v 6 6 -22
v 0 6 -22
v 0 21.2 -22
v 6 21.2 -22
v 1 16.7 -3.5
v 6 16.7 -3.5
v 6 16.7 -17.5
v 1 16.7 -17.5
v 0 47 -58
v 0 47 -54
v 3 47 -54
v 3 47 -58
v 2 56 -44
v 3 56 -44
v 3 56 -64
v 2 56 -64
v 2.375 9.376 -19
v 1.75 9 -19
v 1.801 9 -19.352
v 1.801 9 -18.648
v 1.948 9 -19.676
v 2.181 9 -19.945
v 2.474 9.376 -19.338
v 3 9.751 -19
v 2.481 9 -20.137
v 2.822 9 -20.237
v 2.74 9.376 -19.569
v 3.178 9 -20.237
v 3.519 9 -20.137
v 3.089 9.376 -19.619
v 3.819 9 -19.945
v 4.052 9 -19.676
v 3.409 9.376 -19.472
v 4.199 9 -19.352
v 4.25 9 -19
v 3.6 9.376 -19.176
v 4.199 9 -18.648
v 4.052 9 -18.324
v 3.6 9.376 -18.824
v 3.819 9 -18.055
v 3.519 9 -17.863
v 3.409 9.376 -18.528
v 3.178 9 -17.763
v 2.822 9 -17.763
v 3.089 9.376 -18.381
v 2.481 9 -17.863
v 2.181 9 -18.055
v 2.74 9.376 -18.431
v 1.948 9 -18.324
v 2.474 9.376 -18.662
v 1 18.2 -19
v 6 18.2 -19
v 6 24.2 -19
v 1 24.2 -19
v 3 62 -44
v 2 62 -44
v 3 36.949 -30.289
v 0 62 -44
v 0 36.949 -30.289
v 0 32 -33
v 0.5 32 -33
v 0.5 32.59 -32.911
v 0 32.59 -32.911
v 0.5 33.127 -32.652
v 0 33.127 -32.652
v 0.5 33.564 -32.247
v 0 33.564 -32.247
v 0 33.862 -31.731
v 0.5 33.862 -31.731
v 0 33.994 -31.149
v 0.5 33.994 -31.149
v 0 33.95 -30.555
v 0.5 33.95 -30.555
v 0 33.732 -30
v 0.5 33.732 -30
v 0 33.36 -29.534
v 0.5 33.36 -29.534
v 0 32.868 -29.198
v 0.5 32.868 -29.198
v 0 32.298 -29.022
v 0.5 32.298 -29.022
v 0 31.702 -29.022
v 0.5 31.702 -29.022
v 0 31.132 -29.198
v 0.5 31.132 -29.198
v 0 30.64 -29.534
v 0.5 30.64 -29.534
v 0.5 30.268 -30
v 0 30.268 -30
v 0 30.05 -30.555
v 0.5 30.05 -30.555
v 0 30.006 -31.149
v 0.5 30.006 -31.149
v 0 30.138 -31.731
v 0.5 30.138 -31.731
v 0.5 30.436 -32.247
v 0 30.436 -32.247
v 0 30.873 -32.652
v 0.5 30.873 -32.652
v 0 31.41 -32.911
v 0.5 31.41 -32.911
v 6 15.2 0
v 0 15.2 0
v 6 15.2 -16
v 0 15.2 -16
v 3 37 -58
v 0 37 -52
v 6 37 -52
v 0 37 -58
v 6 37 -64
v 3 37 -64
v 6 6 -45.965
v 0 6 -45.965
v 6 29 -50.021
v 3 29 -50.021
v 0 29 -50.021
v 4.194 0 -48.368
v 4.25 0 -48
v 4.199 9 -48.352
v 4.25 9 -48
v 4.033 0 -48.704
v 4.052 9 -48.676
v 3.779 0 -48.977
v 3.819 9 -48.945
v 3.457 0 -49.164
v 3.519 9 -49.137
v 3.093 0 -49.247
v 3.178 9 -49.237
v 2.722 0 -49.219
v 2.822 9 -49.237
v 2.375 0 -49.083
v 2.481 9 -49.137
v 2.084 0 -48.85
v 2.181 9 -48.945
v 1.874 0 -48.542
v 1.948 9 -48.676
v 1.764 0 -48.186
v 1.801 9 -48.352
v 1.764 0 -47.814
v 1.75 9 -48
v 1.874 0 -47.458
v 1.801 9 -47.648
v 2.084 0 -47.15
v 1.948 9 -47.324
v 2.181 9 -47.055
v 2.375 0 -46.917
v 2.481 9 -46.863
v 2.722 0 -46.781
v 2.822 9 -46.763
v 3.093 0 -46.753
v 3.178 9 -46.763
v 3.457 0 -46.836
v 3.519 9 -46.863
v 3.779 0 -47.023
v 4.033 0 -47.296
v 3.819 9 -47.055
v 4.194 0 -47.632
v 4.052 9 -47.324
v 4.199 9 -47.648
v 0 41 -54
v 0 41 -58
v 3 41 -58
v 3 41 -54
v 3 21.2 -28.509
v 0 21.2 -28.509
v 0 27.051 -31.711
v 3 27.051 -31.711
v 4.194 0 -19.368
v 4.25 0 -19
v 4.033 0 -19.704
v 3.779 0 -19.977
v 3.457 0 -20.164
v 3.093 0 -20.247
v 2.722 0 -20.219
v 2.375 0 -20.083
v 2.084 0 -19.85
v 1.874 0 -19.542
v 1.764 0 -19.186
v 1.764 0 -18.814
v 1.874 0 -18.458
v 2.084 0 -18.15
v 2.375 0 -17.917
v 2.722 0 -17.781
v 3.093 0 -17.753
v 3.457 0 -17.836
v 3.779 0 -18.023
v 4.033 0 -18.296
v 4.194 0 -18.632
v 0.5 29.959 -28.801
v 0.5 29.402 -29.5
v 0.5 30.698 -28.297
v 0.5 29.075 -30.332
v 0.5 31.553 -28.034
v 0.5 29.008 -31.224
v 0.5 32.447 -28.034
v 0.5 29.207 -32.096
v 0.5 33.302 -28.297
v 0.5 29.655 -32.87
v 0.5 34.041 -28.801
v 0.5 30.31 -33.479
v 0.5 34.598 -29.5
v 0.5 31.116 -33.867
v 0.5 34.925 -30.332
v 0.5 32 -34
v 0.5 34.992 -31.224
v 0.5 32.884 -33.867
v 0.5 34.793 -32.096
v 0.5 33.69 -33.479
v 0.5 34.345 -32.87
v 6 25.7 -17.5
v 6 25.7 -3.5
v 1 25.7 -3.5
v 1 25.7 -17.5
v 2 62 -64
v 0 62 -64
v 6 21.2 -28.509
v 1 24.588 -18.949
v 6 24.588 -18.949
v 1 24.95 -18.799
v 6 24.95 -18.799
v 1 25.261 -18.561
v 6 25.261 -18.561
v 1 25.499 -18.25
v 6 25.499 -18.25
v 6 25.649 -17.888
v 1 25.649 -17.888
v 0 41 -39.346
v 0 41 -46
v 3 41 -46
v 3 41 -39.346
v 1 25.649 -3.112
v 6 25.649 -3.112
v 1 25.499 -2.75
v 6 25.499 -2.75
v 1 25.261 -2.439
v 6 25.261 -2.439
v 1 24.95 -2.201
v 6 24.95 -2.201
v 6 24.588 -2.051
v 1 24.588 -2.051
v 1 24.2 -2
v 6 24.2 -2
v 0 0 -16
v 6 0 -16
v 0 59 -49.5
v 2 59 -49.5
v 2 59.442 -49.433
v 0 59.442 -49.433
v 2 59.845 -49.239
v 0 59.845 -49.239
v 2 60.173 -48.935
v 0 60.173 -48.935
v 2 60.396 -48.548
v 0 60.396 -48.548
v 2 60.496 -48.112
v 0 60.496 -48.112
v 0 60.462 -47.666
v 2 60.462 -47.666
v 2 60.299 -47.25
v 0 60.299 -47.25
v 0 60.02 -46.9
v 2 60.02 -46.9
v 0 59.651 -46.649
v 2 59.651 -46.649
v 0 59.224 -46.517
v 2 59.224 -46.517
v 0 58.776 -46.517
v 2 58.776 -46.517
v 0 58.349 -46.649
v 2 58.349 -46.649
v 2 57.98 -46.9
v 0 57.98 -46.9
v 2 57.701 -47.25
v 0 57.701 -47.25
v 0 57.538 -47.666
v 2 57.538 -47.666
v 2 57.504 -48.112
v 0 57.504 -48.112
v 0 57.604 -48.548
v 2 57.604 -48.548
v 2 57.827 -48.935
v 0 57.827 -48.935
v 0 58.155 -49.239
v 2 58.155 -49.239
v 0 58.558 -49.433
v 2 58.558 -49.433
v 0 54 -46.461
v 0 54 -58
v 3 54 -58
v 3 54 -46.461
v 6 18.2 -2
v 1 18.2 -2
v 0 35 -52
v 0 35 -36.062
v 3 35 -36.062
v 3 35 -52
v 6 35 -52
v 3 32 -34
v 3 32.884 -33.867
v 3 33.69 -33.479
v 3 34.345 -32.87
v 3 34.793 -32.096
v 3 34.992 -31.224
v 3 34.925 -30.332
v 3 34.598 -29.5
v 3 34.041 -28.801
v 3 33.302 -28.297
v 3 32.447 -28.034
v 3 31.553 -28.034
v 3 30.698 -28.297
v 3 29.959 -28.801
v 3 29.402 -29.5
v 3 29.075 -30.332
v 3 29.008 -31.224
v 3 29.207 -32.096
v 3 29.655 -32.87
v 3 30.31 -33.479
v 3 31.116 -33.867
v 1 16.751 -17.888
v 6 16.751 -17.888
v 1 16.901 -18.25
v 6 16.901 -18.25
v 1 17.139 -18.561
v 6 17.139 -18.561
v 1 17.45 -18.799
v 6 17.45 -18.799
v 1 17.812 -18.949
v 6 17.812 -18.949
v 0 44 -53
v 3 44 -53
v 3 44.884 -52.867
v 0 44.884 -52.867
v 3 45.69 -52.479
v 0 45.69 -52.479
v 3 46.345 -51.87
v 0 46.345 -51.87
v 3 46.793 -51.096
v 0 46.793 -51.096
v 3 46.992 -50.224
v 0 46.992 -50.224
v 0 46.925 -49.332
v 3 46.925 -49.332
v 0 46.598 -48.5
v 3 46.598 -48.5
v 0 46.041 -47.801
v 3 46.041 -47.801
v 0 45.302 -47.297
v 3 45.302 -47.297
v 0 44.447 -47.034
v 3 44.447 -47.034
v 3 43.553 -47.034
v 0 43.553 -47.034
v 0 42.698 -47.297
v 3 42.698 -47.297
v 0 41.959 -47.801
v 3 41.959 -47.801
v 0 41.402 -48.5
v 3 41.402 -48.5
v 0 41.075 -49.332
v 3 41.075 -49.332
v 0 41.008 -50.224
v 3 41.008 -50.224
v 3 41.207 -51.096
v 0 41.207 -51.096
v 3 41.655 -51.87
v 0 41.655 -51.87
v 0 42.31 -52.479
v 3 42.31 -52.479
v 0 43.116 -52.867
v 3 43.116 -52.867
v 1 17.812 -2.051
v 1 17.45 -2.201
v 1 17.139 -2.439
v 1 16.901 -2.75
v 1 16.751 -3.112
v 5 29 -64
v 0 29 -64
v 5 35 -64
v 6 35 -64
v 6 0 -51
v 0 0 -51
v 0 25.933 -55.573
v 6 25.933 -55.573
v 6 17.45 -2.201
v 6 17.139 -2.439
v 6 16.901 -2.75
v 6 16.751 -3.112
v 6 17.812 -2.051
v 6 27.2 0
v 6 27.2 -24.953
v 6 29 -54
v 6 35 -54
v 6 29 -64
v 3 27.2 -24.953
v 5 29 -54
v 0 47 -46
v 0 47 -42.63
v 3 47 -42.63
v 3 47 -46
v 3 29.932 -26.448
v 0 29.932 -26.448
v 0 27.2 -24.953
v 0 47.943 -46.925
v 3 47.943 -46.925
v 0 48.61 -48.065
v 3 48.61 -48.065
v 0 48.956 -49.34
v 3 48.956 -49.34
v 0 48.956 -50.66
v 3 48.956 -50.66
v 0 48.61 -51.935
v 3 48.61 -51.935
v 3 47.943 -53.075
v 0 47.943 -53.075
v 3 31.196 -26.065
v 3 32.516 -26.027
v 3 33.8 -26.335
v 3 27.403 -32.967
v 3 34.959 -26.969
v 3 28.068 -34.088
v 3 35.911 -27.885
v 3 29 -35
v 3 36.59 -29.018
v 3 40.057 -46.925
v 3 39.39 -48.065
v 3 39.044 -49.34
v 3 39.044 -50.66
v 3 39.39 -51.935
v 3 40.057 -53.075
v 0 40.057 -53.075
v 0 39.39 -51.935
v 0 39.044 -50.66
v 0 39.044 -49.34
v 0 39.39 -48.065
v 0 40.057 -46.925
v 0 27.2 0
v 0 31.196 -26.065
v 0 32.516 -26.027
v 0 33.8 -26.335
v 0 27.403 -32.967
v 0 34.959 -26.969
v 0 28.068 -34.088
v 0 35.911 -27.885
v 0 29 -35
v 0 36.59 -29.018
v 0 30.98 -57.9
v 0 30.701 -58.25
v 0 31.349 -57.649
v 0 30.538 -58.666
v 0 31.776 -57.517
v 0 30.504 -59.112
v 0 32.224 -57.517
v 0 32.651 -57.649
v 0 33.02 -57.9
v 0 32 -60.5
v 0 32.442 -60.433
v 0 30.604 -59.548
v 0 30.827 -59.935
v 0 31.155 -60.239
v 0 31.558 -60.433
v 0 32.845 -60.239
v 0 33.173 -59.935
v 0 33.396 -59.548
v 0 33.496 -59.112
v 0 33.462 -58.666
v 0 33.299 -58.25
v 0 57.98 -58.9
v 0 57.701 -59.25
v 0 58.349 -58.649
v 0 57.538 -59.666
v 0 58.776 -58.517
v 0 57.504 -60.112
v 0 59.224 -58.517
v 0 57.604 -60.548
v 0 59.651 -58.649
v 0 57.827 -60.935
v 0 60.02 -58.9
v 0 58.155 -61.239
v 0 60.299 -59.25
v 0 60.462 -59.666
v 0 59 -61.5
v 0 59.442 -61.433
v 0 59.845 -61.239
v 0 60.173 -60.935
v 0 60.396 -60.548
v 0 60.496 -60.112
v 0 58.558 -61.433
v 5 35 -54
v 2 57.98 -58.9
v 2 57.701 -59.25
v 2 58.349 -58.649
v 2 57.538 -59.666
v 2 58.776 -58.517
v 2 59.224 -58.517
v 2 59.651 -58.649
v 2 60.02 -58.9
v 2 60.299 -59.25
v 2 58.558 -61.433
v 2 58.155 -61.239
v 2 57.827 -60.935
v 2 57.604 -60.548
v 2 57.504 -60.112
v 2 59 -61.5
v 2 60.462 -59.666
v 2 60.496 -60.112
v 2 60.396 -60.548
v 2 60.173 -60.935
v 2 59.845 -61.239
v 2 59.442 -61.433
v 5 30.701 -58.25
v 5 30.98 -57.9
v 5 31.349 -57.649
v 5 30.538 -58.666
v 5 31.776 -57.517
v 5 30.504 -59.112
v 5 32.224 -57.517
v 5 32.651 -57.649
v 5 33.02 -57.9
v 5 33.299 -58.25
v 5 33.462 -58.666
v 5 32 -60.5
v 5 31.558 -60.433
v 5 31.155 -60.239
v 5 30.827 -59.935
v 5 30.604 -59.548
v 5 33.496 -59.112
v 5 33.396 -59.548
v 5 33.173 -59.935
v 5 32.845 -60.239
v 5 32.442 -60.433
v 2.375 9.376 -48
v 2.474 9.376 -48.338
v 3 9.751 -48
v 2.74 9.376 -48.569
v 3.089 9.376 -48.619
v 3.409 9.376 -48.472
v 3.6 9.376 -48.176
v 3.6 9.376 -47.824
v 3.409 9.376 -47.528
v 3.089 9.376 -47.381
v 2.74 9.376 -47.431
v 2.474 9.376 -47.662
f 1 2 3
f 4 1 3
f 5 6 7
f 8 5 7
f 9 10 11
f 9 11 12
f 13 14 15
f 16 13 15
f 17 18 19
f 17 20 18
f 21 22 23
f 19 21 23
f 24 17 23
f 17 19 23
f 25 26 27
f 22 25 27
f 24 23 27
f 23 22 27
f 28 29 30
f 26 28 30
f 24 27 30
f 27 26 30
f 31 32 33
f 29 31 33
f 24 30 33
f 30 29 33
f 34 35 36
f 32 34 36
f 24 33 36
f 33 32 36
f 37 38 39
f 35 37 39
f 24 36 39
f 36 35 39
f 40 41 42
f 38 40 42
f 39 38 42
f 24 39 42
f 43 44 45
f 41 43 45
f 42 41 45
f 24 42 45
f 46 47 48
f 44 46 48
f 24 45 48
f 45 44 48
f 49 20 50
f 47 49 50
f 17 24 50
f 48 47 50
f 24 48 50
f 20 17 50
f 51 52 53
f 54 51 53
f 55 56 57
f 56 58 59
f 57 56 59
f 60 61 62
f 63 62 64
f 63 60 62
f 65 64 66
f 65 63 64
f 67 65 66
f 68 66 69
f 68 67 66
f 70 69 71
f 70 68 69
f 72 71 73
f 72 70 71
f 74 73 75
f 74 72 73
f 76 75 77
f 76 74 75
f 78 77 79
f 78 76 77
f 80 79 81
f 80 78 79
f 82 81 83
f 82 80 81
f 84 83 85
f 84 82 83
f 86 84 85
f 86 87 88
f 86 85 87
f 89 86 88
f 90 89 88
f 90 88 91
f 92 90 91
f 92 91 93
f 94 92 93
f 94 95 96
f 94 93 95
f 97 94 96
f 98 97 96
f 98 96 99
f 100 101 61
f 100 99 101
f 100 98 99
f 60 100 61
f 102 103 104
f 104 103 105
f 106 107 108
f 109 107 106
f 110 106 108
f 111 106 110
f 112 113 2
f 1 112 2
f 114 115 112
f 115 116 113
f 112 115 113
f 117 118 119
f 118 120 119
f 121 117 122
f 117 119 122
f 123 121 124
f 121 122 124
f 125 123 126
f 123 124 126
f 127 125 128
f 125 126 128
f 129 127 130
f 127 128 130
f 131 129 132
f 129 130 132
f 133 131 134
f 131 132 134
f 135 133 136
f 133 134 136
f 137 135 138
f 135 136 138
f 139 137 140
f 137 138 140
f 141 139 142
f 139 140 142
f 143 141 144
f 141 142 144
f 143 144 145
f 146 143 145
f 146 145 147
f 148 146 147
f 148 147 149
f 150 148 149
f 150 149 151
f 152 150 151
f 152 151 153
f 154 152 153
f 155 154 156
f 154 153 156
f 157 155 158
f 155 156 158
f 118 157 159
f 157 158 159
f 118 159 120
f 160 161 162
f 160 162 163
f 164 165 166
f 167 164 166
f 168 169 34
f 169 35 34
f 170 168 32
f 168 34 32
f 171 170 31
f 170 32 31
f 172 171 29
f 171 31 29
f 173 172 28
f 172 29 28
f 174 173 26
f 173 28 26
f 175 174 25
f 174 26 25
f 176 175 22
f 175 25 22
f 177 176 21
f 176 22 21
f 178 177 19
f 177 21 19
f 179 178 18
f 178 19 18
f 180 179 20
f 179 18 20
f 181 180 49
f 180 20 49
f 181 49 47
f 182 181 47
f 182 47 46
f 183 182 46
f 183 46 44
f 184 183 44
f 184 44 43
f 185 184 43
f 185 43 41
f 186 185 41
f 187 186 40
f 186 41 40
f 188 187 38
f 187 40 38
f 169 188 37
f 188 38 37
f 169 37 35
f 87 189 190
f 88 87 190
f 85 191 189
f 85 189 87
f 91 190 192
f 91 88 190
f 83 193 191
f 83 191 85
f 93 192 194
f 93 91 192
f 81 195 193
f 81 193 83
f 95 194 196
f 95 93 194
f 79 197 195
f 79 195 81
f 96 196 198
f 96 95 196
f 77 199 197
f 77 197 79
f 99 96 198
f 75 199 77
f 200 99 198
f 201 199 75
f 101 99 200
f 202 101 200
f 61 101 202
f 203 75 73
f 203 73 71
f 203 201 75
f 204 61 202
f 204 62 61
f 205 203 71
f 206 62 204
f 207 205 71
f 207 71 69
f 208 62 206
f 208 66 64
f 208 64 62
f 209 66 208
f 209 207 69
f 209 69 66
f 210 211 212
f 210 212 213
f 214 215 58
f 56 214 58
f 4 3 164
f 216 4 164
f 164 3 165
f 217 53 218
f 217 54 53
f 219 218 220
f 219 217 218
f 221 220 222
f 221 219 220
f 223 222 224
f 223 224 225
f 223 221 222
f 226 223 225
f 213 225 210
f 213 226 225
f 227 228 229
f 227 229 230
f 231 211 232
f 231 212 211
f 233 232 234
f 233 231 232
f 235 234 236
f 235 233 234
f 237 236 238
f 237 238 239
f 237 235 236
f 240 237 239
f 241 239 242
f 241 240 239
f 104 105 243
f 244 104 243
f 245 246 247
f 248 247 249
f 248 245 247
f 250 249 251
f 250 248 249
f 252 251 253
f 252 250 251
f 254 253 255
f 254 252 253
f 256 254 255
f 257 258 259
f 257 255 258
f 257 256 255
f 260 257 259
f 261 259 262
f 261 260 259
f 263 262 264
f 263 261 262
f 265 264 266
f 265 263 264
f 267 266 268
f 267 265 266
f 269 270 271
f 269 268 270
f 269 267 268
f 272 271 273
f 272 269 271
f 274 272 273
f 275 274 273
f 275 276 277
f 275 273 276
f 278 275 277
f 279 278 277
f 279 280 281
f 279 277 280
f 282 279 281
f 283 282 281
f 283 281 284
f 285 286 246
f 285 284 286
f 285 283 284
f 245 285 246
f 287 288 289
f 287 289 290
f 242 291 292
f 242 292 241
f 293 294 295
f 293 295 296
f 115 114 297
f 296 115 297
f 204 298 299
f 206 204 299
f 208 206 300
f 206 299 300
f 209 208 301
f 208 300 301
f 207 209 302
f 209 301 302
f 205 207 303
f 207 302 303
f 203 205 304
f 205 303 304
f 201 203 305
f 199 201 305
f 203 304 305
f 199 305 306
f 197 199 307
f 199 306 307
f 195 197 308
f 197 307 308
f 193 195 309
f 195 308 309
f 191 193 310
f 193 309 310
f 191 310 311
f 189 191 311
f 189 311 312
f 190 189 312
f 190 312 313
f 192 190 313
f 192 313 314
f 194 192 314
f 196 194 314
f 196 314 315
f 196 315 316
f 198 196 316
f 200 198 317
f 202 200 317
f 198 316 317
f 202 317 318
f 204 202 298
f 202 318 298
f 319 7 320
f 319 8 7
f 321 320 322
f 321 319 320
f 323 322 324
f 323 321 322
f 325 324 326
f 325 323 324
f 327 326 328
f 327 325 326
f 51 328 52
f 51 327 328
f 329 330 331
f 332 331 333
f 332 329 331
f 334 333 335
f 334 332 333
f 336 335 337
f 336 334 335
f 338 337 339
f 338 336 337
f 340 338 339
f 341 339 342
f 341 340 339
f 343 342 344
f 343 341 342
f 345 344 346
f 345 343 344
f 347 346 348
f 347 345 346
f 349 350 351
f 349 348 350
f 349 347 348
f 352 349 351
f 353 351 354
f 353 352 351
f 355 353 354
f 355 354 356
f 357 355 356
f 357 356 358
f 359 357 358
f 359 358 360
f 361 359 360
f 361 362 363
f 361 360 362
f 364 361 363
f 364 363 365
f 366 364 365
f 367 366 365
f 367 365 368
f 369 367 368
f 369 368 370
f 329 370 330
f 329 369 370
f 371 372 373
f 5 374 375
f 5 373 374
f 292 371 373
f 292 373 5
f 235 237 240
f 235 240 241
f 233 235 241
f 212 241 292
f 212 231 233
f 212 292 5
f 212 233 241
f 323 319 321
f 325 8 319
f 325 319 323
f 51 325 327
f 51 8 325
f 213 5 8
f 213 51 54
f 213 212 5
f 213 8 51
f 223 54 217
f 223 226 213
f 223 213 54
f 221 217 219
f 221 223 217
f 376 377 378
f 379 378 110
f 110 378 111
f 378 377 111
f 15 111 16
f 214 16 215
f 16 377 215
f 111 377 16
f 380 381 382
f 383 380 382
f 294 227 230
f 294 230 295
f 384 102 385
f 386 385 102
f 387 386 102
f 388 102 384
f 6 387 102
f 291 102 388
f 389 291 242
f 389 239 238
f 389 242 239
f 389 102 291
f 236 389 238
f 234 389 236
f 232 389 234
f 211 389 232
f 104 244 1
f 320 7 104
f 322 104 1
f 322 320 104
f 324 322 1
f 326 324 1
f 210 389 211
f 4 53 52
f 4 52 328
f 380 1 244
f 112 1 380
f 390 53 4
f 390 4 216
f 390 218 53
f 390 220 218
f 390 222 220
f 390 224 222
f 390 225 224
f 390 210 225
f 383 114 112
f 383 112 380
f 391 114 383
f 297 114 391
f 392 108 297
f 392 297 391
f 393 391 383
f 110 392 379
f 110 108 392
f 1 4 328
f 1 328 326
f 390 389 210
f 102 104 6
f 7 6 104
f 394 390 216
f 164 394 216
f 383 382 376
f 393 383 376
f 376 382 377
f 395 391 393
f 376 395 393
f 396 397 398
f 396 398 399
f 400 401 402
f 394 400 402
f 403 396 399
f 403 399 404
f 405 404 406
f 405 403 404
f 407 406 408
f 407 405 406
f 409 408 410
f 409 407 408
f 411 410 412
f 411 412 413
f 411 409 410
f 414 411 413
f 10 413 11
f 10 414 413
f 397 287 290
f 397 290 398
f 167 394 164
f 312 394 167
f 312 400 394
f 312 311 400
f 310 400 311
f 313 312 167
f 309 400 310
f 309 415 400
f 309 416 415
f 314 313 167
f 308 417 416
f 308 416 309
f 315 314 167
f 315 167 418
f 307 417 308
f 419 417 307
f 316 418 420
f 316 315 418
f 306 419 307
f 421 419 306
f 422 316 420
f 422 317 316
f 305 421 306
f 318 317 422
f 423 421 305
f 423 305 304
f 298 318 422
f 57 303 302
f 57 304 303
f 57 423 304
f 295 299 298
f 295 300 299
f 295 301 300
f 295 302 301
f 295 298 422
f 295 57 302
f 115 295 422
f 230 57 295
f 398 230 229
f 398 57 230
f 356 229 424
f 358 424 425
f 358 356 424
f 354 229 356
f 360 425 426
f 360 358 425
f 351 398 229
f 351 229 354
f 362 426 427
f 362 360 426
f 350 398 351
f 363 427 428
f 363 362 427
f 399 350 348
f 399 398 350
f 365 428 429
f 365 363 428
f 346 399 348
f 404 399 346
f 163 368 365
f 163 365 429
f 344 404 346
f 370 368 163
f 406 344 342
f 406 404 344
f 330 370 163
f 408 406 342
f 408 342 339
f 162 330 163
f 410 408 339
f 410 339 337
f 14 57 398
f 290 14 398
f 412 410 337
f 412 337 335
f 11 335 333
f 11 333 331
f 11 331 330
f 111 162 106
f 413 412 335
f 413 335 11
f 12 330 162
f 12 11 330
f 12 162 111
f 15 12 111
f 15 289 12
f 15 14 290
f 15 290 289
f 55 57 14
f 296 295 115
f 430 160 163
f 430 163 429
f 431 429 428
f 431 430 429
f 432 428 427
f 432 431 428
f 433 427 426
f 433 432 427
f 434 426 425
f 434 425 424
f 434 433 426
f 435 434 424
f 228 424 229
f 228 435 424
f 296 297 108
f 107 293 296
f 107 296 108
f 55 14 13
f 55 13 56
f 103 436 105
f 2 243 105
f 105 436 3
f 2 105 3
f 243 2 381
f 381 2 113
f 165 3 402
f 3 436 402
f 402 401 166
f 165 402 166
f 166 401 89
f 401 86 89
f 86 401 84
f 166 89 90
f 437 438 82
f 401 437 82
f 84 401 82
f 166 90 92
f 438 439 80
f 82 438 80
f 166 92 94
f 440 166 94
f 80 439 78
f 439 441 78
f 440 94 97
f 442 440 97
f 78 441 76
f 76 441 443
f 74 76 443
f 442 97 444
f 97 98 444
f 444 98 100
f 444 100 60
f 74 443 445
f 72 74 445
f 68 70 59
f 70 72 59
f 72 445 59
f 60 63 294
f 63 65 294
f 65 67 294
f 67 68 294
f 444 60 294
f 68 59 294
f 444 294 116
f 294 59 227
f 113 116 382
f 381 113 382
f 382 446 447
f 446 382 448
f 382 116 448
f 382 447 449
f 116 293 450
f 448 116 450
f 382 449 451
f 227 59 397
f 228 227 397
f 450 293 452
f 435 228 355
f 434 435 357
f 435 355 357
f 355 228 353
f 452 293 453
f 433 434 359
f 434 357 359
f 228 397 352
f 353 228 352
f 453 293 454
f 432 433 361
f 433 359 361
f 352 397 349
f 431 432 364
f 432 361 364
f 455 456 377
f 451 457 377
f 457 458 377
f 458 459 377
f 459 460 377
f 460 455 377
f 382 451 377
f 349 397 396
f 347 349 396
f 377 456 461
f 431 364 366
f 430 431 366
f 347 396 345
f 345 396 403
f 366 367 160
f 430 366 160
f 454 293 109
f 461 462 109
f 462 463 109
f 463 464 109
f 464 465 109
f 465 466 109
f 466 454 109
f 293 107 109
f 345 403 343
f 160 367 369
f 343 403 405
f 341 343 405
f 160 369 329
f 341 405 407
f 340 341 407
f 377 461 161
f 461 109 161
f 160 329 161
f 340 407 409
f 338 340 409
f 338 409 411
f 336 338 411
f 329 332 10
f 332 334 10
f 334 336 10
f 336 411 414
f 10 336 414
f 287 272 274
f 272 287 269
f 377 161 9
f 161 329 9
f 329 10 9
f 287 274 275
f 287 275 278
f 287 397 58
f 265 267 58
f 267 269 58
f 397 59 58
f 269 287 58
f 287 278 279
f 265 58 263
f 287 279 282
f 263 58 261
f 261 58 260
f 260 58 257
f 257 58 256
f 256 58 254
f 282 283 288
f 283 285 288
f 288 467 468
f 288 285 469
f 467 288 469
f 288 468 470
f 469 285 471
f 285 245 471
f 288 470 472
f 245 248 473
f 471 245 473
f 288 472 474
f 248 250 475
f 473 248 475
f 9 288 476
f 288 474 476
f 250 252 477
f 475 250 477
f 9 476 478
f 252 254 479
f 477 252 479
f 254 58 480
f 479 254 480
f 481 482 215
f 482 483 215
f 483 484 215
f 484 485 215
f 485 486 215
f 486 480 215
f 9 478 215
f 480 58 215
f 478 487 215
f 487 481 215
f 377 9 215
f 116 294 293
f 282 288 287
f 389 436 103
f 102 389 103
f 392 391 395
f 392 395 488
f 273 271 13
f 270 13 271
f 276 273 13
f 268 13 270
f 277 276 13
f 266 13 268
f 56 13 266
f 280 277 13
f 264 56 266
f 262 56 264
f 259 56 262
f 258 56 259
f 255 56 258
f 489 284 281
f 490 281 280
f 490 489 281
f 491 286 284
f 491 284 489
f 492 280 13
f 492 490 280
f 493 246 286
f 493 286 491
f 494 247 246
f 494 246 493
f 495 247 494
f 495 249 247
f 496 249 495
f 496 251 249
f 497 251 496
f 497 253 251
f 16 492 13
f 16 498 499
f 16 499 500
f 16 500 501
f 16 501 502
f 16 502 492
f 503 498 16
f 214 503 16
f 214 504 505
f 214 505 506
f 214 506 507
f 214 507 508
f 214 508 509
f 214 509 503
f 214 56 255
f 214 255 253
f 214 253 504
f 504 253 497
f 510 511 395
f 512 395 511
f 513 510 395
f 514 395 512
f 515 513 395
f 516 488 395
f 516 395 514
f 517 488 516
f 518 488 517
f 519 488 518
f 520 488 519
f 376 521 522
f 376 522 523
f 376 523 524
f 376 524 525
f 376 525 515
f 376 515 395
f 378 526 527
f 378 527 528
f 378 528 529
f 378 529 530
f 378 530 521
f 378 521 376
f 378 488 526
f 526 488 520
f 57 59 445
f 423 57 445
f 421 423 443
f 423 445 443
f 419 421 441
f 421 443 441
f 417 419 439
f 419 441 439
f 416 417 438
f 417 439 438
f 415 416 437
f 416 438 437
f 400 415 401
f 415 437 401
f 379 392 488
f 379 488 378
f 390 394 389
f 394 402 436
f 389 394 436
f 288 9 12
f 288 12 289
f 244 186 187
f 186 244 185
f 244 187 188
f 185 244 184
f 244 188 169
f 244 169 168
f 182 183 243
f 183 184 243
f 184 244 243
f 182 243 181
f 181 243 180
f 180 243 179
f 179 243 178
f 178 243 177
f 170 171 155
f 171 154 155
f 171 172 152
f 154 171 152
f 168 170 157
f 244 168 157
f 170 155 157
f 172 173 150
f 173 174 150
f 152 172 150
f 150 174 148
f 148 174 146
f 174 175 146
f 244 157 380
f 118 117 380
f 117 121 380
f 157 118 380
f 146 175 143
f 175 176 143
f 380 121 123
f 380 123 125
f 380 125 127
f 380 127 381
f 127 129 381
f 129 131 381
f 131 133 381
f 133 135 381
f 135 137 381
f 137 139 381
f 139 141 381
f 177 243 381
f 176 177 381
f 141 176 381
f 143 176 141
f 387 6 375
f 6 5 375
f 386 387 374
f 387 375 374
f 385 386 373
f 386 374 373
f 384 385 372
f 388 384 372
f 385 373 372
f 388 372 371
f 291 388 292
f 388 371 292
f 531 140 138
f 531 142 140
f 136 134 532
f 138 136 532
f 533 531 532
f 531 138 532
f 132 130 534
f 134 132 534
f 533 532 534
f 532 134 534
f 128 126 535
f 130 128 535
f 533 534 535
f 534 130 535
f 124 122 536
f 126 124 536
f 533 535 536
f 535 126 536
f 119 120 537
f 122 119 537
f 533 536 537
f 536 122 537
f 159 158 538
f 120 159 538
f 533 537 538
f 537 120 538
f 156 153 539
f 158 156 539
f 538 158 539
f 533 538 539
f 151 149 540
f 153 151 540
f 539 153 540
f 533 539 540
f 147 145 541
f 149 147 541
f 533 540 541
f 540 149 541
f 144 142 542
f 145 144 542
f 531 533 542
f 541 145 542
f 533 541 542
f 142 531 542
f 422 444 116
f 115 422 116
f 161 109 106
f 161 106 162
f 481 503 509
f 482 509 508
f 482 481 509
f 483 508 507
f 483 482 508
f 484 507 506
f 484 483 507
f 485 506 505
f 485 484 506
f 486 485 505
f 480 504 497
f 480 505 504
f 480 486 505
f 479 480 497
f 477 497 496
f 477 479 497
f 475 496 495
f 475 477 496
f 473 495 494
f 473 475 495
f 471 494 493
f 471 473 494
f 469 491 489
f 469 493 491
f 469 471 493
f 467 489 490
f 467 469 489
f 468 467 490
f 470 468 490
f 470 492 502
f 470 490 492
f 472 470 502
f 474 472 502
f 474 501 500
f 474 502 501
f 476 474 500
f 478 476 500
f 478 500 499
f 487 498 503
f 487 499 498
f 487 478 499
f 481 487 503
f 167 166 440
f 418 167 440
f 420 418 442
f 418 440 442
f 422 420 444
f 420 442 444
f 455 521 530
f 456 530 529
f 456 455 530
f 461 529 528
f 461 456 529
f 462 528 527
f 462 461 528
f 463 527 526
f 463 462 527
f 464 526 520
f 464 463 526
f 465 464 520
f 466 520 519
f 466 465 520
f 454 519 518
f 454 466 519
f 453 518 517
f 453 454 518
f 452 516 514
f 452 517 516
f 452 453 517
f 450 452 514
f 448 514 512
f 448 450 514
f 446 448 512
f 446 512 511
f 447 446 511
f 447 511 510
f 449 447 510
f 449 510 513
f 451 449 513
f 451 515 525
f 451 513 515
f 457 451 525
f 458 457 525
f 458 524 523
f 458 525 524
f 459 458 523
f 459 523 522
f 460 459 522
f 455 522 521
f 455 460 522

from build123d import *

# Parameters (mm, degrees)
SKETCH1_R                   = 1.5
SKETCH1_R_2                 = 3
SKETCH1_R_3                 = 2
BOSS_EXTRUDE1_DEPTH         = 6
TAP_DRILL_FOR_M3_TAP1_D     = 2.5
TAP_DRILL_FOR_M3_TAP1_DEPTH = 9
TAP_DRILL_FOR_M3_TAP1_TIP   = 0.751075774
CUT_EXTRUDE4_DEPTH          = 3
SKETCH14_W                  = 20
SKETCH14_H                  = 6
CUT_EXTRUDE5_DEPTH          = 1
SKETCH15_W                  = 10
SKETCH15_H                  = 6
CUT_EXTRUDE6_DEPTH          = 1
SKETCH16_R                  = 3
CUT_EXTRUDE7_DEPTH          = 2.5
SKETCH17_W                  = 17
SKETCH17_H                  = 9
CUT_EXTRUDE8_DEPTH          = 5
FILLET1_R                   = 1.5


with BuildPart() as part:
    # Sketch1 → Boss-Extrude1 (new body)
    with BuildSketch(Plane(origin=(0, 0, 0), x_dir=(0, 0, -1), z_dir=(1, 0, 0))):
        with BuildLine():
            Line((51, 0), (55.572632785, 25.93268918))
            Line((55.572632785, 25.93268918), (64, 29))
            Line((64, 29), (64, 62))
            Line((64, 62), (44, 62))
            Line((44, 62), (30.288877114, 36.949172076))
            ThreePointArc((30.288877114, 36.949172076), (26.613988607, 34.400604937), (26.447909215, 29.931553848))
            Line((26.447909215, 29.931553848), (24.952842042, 27.2))
            Line((24.952842042, 27.2), (0, 27.2))
            Line((0, 27.2), (0, 15.2))
            Line((0, 15.2), (16, 15.2))
            Line((16, 15.2), (16, 0))
            Line((16, 0), (51, 0))
        make_face()
        with Locations((59, 32)):
            Circle(SKETCH1_R, mode=Mode.SUBTRACT)
        with Locations((50, 44)):
            Circle(SKETCH1_R_2, mode=Mode.SUBTRACT)
        with Locations((60, 59)):
            Circle(SKETCH1_R, mode=Mode.SUBTRACT)
        with Locations((48, 59)):
            Circle(SKETCH1_R, mode=Mode.SUBTRACT)
        with Locations((31, 32)):
            Circle(SKETCH1_R_3, mode=Mode.SUBTRACT)
        with BuildLine():
            Line((39.345952884, 41), (36.061960132, 35))
            Line((36.061960132, 35), (52, 35))
            Line((52, 35), (52, 37))
            Line((52, 37), (58, 37))
            Line((58, 37), (58, 41))
            Line((58, 41), (54, 41))
            ThreePointArc((54, 41), (50, 39), (46, 41))
            Line((46, 41), (39.345952884, 41))
        make_face(mode=Mode.SUBTRACT)
        with BuildLine():
            Line((46.461270512, 54), (42.629945635, 47))
            Line((42.629945635, 47), (46, 47))
            ThreePointArc((46, 47), (50, 49), (54, 47))
            Line((54, 47), (58, 47))
            Line((58, 47), (58, 54))
            Line((58, 54), (46.461270512, 54))
        make_face(mode=Mode.SUBTRACT)
        with BuildLine():
            Line((35, 29), (50.020922769, 29))
            Line((50.020922769, 29), (45.965402213, 6))
            Line((45.965402213, 6), (22, 6))
            Line((22, 6), (22, 21.2))
            Line((22, 21.2), (28.508776804, 21.2))
            Line((28.508776804, 21.2), (31.711122886, 27.050827924))
            ThreePointArc((31.711122886, 27.050827924), (33.549213145, 27.698661564), (35, 29))
        make_face(mode=Mode.SUBTRACT)
    extrude(amount=BOSS_EXTRUDE1_DEPTH)

    # Tap Drill for M3 Tap1
    with Locations(Plane(origin=(0, 0, 0), x_dir=(-1, 0, 0), z_dir=(0, -1, 0))):
        with Locations((-3, 48), (-3, 19)):
            Hole(TAP_DRILL_FOR_M3_TAP1_D / 2, depth=TAP_DRILL_FOR_M3_TAP1_DEPTH)
            with Locations((0, 0, -(TAP_DRILL_FOR_M3_TAP1_DEPTH + TAP_DRILL_FOR_M3_TAP1_TIP / 2))):  # 118° drill point
                Cone(0, TAP_DRILL_FOR_M3_TAP1_D / 2, TAP_DRILL_FOR_M3_TAP1_TIP, mode=Mode.SUBTRACT)

    # Sketch13 → Cut-Extrude4 (cut)
    with BuildSketch(Plane(origin=(6, 0, 0), x_dir=(0, 0, -1), z_dir=(1, 0, 0))):
        Polygon((52, 37), (64, 37), (64, 62), (44, 62), (30.288877114, 36.949172076), (28.008901276, 36.949172076), (23.767530455, 29.2), (28.508776804, 21.2), (50.020922769, 29), (52, 35), align=None)
    extrude(amount=-CUT_EXTRUDE4_DEPTH, mode=Mode.SUBTRACT)

    # Sketch14 → Cut-Extrude5 (cut)
    with BuildSketch(Plane(origin=(3, 0, 0), x_dir=(0, 0, -1), z_dir=(1, 0, 0))):
        with Locations((54, 59)):
            Rectangle(SKETCH14_W, SKETCH14_H)
    extrude(amount=-CUT_EXTRUDE5_DEPTH, mode=Mode.SUBTRACT)

    # Sketch15 → Cut-Extrude6 (cut)
    with BuildSketch(Plane(origin=(6, 0, 0), x_dir=(0, 0, -1), z_dir=(1, 0, 0))):
        with Locations((59, 32)):
            Rectangle(SKETCH15_W, SKETCH15_H)
    extrude(amount=-CUT_EXTRUDE6_DEPTH, mode=Mode.SUBTRACT)

    # Sketch16 → Cut-Extrude7 (cut)
    with BuildSketch(Plane(origin=(3, 0, 0), x_dir=(0, 0, -1), z_dir=(1, 0, 0))):
        with Locations((31, 32)):
            Circle(SKETCH16_R)
    extrude(amount=-CUT_EXTRUDE7_DEPTH, mode=Mode.SUBTRACT)

    # Sketch17 → Cut-Extrude8 (cut)
    with BuildSketch(Plane(origin=(6, 0, 0), x_dir=(0, 0, -1), z_dir=(1, 0, 0))):
        with Locations((10.5, 21.2)):
            Rectangle(SKETCH17_W, SKETCH17_H)
    extrude(amount=-CUT_EXTRUDE8_DEPTH, mode=Mode.SUBTRACT)

    # Fillet1
    fillet1_edges = [part.edges().sort_by_distance(p)[0] for p in [
        (3.5, 16.7, -2),
        (3.5, 25.7, -2),
        (3.5, 25.7, -19),
        (3.5, 16.7, -19),
    ]]
    fillet(fillet1_edges, radius=FILLET1_R)


solid = part.part
